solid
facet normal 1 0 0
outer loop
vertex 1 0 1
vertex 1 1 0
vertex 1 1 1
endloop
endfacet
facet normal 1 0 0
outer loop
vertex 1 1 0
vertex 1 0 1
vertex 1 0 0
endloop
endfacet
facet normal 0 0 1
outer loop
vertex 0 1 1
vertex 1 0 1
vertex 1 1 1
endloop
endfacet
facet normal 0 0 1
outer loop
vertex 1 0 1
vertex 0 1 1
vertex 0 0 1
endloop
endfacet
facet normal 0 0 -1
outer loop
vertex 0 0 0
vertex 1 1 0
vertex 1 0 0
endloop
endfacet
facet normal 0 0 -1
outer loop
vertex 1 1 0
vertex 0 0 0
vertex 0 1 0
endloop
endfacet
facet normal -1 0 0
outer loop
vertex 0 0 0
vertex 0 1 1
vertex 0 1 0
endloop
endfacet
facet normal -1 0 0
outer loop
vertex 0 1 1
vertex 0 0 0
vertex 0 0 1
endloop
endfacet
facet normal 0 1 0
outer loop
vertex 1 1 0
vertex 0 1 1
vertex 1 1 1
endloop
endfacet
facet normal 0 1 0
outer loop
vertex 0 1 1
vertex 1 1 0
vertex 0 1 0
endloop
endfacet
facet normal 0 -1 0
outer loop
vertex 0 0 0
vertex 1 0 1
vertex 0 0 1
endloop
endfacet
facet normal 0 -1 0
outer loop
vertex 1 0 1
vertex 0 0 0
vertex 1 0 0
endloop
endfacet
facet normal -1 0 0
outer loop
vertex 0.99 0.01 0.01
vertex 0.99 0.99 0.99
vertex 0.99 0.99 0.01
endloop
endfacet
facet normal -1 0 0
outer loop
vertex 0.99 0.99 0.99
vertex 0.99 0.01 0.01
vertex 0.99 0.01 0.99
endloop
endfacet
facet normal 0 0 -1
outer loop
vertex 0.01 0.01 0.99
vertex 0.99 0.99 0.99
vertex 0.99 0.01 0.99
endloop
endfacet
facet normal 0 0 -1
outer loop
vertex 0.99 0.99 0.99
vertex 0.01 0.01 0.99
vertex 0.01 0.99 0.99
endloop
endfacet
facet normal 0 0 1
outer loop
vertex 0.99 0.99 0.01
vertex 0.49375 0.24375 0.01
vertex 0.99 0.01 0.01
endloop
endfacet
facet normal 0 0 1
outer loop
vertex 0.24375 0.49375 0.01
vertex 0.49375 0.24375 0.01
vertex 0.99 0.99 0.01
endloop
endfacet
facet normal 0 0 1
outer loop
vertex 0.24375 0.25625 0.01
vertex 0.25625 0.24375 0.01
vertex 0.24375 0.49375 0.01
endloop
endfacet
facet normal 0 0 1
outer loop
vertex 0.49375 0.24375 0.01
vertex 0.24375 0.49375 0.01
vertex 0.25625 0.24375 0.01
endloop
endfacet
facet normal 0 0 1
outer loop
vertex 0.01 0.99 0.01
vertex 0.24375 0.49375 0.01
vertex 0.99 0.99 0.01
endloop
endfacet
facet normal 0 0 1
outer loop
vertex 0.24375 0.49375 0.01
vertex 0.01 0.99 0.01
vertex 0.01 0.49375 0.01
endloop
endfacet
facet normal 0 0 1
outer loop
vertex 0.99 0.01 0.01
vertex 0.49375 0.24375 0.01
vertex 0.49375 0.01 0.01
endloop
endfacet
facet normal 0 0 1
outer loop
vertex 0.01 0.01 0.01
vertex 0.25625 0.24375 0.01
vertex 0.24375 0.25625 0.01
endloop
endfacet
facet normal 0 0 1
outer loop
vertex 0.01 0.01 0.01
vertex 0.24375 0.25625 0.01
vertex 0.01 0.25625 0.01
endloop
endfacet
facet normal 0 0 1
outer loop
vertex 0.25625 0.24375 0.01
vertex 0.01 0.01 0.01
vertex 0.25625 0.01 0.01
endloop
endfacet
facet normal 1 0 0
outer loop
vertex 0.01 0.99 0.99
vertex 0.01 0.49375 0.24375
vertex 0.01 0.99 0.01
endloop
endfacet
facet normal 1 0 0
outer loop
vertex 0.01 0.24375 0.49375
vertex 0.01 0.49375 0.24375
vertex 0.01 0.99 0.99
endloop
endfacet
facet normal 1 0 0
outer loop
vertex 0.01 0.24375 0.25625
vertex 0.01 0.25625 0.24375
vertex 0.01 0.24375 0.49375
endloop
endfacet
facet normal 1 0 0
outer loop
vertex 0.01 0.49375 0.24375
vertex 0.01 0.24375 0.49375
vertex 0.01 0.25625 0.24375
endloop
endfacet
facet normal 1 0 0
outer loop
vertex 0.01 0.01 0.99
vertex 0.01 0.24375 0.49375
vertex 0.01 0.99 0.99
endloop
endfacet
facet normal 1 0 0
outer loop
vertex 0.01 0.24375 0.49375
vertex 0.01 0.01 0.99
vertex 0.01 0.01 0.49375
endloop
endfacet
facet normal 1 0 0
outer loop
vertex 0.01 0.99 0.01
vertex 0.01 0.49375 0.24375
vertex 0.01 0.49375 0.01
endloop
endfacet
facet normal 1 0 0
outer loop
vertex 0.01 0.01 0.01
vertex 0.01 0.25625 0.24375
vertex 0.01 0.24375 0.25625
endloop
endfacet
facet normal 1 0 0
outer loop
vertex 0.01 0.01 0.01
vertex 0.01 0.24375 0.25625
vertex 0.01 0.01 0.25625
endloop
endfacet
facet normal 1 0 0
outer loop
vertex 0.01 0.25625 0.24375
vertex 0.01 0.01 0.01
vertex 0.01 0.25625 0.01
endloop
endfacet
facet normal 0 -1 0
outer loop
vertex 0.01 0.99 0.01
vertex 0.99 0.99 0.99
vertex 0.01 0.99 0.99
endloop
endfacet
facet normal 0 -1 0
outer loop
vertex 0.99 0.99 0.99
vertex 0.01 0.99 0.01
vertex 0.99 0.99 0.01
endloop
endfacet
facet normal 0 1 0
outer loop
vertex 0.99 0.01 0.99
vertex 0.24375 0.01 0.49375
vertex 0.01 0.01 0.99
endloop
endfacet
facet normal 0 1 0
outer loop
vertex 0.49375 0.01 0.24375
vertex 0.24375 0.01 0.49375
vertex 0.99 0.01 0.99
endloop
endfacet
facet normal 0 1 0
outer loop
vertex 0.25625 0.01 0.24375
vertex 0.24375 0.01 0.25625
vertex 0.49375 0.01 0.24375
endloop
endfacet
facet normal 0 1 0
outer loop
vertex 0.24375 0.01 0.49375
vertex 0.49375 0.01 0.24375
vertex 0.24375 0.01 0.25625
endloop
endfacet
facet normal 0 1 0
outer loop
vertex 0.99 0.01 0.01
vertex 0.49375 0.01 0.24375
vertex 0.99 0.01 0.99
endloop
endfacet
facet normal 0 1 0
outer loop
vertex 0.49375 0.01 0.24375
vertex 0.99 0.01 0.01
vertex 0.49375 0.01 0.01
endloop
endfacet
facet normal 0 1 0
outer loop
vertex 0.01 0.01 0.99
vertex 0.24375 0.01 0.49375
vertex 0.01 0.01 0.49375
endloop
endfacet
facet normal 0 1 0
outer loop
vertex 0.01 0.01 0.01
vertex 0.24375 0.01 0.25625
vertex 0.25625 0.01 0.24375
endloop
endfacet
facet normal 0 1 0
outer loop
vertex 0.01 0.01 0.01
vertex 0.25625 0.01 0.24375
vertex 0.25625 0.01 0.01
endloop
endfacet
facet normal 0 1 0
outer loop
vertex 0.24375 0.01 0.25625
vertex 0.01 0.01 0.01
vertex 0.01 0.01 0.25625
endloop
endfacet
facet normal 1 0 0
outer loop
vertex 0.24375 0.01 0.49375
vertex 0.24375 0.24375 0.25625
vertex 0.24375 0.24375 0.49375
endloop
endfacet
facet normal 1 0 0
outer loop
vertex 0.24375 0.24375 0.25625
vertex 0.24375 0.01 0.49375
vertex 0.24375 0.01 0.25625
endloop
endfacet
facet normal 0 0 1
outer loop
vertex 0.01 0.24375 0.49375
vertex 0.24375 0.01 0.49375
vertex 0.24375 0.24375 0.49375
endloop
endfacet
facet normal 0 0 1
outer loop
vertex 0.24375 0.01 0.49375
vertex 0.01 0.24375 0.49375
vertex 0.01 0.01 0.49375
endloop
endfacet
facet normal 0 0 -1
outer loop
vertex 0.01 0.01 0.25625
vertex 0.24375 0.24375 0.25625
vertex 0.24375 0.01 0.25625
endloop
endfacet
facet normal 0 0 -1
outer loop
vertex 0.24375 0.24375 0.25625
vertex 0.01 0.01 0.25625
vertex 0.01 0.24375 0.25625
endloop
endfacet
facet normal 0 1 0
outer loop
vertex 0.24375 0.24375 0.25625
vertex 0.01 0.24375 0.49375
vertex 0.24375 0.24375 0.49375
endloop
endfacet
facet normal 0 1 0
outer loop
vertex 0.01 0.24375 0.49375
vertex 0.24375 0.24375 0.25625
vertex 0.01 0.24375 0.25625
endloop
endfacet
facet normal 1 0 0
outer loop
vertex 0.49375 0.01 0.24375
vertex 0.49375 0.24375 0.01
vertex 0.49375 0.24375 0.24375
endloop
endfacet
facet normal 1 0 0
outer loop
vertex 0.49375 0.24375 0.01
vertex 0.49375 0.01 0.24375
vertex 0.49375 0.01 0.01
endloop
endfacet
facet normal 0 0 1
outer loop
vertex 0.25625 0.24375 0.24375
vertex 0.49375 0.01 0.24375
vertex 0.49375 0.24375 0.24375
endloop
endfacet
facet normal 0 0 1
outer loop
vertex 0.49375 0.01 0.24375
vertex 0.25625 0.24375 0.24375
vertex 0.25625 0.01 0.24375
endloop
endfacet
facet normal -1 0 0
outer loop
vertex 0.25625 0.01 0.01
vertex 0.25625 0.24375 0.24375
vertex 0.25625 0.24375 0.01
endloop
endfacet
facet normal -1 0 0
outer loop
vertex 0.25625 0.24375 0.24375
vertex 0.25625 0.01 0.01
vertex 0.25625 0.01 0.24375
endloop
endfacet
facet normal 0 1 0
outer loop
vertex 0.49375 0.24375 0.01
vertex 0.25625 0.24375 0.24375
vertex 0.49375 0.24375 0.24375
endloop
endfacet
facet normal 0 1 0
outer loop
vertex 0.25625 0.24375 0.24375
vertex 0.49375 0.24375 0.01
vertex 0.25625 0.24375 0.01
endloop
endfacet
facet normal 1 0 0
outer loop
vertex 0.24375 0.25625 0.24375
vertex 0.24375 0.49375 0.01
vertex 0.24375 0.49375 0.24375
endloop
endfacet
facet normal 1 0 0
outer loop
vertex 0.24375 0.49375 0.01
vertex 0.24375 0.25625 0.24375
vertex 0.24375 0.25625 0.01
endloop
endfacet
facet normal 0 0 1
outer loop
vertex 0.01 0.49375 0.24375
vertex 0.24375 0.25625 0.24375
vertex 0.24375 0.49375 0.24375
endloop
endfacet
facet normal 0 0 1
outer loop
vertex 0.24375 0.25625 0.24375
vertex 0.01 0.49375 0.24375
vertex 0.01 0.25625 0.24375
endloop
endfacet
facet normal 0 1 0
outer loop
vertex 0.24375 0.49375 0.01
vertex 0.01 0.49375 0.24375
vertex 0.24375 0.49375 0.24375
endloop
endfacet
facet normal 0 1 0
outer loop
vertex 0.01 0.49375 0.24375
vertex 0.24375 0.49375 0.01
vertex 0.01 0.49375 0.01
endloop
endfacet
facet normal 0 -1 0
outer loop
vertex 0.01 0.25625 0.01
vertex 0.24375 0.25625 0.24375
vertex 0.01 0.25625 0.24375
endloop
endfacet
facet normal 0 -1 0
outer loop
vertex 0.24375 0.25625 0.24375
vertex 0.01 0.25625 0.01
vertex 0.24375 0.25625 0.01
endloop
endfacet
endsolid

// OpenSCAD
translate([0.125, 0.125, 0.375]) color([0.18327488955431748, 0.8508590189062505, 0.29785415045258956]) cube([0.2375, 0.2375, 0.2375], center=true);
translate([0.375, 0.125, 0.125]) color([0.411094591289488, 0.47496521267566827, 0.8230140415091162]) cube([0.2375, 0.2375, 0.2375], center=true);
translate([0.125, 0.375, 0.125]) color([0.021499284860199475, 0.7360068744554104, 0.893171130180962]) cube([0.2375, 0.2375, 0.2375], center=true);
color([0.3,0.3,0.3,0.3]) difference() { cube([1,1,1]); translate([0.01,0.01,0.01]) cube([0.98,0.98,0.98]); }
